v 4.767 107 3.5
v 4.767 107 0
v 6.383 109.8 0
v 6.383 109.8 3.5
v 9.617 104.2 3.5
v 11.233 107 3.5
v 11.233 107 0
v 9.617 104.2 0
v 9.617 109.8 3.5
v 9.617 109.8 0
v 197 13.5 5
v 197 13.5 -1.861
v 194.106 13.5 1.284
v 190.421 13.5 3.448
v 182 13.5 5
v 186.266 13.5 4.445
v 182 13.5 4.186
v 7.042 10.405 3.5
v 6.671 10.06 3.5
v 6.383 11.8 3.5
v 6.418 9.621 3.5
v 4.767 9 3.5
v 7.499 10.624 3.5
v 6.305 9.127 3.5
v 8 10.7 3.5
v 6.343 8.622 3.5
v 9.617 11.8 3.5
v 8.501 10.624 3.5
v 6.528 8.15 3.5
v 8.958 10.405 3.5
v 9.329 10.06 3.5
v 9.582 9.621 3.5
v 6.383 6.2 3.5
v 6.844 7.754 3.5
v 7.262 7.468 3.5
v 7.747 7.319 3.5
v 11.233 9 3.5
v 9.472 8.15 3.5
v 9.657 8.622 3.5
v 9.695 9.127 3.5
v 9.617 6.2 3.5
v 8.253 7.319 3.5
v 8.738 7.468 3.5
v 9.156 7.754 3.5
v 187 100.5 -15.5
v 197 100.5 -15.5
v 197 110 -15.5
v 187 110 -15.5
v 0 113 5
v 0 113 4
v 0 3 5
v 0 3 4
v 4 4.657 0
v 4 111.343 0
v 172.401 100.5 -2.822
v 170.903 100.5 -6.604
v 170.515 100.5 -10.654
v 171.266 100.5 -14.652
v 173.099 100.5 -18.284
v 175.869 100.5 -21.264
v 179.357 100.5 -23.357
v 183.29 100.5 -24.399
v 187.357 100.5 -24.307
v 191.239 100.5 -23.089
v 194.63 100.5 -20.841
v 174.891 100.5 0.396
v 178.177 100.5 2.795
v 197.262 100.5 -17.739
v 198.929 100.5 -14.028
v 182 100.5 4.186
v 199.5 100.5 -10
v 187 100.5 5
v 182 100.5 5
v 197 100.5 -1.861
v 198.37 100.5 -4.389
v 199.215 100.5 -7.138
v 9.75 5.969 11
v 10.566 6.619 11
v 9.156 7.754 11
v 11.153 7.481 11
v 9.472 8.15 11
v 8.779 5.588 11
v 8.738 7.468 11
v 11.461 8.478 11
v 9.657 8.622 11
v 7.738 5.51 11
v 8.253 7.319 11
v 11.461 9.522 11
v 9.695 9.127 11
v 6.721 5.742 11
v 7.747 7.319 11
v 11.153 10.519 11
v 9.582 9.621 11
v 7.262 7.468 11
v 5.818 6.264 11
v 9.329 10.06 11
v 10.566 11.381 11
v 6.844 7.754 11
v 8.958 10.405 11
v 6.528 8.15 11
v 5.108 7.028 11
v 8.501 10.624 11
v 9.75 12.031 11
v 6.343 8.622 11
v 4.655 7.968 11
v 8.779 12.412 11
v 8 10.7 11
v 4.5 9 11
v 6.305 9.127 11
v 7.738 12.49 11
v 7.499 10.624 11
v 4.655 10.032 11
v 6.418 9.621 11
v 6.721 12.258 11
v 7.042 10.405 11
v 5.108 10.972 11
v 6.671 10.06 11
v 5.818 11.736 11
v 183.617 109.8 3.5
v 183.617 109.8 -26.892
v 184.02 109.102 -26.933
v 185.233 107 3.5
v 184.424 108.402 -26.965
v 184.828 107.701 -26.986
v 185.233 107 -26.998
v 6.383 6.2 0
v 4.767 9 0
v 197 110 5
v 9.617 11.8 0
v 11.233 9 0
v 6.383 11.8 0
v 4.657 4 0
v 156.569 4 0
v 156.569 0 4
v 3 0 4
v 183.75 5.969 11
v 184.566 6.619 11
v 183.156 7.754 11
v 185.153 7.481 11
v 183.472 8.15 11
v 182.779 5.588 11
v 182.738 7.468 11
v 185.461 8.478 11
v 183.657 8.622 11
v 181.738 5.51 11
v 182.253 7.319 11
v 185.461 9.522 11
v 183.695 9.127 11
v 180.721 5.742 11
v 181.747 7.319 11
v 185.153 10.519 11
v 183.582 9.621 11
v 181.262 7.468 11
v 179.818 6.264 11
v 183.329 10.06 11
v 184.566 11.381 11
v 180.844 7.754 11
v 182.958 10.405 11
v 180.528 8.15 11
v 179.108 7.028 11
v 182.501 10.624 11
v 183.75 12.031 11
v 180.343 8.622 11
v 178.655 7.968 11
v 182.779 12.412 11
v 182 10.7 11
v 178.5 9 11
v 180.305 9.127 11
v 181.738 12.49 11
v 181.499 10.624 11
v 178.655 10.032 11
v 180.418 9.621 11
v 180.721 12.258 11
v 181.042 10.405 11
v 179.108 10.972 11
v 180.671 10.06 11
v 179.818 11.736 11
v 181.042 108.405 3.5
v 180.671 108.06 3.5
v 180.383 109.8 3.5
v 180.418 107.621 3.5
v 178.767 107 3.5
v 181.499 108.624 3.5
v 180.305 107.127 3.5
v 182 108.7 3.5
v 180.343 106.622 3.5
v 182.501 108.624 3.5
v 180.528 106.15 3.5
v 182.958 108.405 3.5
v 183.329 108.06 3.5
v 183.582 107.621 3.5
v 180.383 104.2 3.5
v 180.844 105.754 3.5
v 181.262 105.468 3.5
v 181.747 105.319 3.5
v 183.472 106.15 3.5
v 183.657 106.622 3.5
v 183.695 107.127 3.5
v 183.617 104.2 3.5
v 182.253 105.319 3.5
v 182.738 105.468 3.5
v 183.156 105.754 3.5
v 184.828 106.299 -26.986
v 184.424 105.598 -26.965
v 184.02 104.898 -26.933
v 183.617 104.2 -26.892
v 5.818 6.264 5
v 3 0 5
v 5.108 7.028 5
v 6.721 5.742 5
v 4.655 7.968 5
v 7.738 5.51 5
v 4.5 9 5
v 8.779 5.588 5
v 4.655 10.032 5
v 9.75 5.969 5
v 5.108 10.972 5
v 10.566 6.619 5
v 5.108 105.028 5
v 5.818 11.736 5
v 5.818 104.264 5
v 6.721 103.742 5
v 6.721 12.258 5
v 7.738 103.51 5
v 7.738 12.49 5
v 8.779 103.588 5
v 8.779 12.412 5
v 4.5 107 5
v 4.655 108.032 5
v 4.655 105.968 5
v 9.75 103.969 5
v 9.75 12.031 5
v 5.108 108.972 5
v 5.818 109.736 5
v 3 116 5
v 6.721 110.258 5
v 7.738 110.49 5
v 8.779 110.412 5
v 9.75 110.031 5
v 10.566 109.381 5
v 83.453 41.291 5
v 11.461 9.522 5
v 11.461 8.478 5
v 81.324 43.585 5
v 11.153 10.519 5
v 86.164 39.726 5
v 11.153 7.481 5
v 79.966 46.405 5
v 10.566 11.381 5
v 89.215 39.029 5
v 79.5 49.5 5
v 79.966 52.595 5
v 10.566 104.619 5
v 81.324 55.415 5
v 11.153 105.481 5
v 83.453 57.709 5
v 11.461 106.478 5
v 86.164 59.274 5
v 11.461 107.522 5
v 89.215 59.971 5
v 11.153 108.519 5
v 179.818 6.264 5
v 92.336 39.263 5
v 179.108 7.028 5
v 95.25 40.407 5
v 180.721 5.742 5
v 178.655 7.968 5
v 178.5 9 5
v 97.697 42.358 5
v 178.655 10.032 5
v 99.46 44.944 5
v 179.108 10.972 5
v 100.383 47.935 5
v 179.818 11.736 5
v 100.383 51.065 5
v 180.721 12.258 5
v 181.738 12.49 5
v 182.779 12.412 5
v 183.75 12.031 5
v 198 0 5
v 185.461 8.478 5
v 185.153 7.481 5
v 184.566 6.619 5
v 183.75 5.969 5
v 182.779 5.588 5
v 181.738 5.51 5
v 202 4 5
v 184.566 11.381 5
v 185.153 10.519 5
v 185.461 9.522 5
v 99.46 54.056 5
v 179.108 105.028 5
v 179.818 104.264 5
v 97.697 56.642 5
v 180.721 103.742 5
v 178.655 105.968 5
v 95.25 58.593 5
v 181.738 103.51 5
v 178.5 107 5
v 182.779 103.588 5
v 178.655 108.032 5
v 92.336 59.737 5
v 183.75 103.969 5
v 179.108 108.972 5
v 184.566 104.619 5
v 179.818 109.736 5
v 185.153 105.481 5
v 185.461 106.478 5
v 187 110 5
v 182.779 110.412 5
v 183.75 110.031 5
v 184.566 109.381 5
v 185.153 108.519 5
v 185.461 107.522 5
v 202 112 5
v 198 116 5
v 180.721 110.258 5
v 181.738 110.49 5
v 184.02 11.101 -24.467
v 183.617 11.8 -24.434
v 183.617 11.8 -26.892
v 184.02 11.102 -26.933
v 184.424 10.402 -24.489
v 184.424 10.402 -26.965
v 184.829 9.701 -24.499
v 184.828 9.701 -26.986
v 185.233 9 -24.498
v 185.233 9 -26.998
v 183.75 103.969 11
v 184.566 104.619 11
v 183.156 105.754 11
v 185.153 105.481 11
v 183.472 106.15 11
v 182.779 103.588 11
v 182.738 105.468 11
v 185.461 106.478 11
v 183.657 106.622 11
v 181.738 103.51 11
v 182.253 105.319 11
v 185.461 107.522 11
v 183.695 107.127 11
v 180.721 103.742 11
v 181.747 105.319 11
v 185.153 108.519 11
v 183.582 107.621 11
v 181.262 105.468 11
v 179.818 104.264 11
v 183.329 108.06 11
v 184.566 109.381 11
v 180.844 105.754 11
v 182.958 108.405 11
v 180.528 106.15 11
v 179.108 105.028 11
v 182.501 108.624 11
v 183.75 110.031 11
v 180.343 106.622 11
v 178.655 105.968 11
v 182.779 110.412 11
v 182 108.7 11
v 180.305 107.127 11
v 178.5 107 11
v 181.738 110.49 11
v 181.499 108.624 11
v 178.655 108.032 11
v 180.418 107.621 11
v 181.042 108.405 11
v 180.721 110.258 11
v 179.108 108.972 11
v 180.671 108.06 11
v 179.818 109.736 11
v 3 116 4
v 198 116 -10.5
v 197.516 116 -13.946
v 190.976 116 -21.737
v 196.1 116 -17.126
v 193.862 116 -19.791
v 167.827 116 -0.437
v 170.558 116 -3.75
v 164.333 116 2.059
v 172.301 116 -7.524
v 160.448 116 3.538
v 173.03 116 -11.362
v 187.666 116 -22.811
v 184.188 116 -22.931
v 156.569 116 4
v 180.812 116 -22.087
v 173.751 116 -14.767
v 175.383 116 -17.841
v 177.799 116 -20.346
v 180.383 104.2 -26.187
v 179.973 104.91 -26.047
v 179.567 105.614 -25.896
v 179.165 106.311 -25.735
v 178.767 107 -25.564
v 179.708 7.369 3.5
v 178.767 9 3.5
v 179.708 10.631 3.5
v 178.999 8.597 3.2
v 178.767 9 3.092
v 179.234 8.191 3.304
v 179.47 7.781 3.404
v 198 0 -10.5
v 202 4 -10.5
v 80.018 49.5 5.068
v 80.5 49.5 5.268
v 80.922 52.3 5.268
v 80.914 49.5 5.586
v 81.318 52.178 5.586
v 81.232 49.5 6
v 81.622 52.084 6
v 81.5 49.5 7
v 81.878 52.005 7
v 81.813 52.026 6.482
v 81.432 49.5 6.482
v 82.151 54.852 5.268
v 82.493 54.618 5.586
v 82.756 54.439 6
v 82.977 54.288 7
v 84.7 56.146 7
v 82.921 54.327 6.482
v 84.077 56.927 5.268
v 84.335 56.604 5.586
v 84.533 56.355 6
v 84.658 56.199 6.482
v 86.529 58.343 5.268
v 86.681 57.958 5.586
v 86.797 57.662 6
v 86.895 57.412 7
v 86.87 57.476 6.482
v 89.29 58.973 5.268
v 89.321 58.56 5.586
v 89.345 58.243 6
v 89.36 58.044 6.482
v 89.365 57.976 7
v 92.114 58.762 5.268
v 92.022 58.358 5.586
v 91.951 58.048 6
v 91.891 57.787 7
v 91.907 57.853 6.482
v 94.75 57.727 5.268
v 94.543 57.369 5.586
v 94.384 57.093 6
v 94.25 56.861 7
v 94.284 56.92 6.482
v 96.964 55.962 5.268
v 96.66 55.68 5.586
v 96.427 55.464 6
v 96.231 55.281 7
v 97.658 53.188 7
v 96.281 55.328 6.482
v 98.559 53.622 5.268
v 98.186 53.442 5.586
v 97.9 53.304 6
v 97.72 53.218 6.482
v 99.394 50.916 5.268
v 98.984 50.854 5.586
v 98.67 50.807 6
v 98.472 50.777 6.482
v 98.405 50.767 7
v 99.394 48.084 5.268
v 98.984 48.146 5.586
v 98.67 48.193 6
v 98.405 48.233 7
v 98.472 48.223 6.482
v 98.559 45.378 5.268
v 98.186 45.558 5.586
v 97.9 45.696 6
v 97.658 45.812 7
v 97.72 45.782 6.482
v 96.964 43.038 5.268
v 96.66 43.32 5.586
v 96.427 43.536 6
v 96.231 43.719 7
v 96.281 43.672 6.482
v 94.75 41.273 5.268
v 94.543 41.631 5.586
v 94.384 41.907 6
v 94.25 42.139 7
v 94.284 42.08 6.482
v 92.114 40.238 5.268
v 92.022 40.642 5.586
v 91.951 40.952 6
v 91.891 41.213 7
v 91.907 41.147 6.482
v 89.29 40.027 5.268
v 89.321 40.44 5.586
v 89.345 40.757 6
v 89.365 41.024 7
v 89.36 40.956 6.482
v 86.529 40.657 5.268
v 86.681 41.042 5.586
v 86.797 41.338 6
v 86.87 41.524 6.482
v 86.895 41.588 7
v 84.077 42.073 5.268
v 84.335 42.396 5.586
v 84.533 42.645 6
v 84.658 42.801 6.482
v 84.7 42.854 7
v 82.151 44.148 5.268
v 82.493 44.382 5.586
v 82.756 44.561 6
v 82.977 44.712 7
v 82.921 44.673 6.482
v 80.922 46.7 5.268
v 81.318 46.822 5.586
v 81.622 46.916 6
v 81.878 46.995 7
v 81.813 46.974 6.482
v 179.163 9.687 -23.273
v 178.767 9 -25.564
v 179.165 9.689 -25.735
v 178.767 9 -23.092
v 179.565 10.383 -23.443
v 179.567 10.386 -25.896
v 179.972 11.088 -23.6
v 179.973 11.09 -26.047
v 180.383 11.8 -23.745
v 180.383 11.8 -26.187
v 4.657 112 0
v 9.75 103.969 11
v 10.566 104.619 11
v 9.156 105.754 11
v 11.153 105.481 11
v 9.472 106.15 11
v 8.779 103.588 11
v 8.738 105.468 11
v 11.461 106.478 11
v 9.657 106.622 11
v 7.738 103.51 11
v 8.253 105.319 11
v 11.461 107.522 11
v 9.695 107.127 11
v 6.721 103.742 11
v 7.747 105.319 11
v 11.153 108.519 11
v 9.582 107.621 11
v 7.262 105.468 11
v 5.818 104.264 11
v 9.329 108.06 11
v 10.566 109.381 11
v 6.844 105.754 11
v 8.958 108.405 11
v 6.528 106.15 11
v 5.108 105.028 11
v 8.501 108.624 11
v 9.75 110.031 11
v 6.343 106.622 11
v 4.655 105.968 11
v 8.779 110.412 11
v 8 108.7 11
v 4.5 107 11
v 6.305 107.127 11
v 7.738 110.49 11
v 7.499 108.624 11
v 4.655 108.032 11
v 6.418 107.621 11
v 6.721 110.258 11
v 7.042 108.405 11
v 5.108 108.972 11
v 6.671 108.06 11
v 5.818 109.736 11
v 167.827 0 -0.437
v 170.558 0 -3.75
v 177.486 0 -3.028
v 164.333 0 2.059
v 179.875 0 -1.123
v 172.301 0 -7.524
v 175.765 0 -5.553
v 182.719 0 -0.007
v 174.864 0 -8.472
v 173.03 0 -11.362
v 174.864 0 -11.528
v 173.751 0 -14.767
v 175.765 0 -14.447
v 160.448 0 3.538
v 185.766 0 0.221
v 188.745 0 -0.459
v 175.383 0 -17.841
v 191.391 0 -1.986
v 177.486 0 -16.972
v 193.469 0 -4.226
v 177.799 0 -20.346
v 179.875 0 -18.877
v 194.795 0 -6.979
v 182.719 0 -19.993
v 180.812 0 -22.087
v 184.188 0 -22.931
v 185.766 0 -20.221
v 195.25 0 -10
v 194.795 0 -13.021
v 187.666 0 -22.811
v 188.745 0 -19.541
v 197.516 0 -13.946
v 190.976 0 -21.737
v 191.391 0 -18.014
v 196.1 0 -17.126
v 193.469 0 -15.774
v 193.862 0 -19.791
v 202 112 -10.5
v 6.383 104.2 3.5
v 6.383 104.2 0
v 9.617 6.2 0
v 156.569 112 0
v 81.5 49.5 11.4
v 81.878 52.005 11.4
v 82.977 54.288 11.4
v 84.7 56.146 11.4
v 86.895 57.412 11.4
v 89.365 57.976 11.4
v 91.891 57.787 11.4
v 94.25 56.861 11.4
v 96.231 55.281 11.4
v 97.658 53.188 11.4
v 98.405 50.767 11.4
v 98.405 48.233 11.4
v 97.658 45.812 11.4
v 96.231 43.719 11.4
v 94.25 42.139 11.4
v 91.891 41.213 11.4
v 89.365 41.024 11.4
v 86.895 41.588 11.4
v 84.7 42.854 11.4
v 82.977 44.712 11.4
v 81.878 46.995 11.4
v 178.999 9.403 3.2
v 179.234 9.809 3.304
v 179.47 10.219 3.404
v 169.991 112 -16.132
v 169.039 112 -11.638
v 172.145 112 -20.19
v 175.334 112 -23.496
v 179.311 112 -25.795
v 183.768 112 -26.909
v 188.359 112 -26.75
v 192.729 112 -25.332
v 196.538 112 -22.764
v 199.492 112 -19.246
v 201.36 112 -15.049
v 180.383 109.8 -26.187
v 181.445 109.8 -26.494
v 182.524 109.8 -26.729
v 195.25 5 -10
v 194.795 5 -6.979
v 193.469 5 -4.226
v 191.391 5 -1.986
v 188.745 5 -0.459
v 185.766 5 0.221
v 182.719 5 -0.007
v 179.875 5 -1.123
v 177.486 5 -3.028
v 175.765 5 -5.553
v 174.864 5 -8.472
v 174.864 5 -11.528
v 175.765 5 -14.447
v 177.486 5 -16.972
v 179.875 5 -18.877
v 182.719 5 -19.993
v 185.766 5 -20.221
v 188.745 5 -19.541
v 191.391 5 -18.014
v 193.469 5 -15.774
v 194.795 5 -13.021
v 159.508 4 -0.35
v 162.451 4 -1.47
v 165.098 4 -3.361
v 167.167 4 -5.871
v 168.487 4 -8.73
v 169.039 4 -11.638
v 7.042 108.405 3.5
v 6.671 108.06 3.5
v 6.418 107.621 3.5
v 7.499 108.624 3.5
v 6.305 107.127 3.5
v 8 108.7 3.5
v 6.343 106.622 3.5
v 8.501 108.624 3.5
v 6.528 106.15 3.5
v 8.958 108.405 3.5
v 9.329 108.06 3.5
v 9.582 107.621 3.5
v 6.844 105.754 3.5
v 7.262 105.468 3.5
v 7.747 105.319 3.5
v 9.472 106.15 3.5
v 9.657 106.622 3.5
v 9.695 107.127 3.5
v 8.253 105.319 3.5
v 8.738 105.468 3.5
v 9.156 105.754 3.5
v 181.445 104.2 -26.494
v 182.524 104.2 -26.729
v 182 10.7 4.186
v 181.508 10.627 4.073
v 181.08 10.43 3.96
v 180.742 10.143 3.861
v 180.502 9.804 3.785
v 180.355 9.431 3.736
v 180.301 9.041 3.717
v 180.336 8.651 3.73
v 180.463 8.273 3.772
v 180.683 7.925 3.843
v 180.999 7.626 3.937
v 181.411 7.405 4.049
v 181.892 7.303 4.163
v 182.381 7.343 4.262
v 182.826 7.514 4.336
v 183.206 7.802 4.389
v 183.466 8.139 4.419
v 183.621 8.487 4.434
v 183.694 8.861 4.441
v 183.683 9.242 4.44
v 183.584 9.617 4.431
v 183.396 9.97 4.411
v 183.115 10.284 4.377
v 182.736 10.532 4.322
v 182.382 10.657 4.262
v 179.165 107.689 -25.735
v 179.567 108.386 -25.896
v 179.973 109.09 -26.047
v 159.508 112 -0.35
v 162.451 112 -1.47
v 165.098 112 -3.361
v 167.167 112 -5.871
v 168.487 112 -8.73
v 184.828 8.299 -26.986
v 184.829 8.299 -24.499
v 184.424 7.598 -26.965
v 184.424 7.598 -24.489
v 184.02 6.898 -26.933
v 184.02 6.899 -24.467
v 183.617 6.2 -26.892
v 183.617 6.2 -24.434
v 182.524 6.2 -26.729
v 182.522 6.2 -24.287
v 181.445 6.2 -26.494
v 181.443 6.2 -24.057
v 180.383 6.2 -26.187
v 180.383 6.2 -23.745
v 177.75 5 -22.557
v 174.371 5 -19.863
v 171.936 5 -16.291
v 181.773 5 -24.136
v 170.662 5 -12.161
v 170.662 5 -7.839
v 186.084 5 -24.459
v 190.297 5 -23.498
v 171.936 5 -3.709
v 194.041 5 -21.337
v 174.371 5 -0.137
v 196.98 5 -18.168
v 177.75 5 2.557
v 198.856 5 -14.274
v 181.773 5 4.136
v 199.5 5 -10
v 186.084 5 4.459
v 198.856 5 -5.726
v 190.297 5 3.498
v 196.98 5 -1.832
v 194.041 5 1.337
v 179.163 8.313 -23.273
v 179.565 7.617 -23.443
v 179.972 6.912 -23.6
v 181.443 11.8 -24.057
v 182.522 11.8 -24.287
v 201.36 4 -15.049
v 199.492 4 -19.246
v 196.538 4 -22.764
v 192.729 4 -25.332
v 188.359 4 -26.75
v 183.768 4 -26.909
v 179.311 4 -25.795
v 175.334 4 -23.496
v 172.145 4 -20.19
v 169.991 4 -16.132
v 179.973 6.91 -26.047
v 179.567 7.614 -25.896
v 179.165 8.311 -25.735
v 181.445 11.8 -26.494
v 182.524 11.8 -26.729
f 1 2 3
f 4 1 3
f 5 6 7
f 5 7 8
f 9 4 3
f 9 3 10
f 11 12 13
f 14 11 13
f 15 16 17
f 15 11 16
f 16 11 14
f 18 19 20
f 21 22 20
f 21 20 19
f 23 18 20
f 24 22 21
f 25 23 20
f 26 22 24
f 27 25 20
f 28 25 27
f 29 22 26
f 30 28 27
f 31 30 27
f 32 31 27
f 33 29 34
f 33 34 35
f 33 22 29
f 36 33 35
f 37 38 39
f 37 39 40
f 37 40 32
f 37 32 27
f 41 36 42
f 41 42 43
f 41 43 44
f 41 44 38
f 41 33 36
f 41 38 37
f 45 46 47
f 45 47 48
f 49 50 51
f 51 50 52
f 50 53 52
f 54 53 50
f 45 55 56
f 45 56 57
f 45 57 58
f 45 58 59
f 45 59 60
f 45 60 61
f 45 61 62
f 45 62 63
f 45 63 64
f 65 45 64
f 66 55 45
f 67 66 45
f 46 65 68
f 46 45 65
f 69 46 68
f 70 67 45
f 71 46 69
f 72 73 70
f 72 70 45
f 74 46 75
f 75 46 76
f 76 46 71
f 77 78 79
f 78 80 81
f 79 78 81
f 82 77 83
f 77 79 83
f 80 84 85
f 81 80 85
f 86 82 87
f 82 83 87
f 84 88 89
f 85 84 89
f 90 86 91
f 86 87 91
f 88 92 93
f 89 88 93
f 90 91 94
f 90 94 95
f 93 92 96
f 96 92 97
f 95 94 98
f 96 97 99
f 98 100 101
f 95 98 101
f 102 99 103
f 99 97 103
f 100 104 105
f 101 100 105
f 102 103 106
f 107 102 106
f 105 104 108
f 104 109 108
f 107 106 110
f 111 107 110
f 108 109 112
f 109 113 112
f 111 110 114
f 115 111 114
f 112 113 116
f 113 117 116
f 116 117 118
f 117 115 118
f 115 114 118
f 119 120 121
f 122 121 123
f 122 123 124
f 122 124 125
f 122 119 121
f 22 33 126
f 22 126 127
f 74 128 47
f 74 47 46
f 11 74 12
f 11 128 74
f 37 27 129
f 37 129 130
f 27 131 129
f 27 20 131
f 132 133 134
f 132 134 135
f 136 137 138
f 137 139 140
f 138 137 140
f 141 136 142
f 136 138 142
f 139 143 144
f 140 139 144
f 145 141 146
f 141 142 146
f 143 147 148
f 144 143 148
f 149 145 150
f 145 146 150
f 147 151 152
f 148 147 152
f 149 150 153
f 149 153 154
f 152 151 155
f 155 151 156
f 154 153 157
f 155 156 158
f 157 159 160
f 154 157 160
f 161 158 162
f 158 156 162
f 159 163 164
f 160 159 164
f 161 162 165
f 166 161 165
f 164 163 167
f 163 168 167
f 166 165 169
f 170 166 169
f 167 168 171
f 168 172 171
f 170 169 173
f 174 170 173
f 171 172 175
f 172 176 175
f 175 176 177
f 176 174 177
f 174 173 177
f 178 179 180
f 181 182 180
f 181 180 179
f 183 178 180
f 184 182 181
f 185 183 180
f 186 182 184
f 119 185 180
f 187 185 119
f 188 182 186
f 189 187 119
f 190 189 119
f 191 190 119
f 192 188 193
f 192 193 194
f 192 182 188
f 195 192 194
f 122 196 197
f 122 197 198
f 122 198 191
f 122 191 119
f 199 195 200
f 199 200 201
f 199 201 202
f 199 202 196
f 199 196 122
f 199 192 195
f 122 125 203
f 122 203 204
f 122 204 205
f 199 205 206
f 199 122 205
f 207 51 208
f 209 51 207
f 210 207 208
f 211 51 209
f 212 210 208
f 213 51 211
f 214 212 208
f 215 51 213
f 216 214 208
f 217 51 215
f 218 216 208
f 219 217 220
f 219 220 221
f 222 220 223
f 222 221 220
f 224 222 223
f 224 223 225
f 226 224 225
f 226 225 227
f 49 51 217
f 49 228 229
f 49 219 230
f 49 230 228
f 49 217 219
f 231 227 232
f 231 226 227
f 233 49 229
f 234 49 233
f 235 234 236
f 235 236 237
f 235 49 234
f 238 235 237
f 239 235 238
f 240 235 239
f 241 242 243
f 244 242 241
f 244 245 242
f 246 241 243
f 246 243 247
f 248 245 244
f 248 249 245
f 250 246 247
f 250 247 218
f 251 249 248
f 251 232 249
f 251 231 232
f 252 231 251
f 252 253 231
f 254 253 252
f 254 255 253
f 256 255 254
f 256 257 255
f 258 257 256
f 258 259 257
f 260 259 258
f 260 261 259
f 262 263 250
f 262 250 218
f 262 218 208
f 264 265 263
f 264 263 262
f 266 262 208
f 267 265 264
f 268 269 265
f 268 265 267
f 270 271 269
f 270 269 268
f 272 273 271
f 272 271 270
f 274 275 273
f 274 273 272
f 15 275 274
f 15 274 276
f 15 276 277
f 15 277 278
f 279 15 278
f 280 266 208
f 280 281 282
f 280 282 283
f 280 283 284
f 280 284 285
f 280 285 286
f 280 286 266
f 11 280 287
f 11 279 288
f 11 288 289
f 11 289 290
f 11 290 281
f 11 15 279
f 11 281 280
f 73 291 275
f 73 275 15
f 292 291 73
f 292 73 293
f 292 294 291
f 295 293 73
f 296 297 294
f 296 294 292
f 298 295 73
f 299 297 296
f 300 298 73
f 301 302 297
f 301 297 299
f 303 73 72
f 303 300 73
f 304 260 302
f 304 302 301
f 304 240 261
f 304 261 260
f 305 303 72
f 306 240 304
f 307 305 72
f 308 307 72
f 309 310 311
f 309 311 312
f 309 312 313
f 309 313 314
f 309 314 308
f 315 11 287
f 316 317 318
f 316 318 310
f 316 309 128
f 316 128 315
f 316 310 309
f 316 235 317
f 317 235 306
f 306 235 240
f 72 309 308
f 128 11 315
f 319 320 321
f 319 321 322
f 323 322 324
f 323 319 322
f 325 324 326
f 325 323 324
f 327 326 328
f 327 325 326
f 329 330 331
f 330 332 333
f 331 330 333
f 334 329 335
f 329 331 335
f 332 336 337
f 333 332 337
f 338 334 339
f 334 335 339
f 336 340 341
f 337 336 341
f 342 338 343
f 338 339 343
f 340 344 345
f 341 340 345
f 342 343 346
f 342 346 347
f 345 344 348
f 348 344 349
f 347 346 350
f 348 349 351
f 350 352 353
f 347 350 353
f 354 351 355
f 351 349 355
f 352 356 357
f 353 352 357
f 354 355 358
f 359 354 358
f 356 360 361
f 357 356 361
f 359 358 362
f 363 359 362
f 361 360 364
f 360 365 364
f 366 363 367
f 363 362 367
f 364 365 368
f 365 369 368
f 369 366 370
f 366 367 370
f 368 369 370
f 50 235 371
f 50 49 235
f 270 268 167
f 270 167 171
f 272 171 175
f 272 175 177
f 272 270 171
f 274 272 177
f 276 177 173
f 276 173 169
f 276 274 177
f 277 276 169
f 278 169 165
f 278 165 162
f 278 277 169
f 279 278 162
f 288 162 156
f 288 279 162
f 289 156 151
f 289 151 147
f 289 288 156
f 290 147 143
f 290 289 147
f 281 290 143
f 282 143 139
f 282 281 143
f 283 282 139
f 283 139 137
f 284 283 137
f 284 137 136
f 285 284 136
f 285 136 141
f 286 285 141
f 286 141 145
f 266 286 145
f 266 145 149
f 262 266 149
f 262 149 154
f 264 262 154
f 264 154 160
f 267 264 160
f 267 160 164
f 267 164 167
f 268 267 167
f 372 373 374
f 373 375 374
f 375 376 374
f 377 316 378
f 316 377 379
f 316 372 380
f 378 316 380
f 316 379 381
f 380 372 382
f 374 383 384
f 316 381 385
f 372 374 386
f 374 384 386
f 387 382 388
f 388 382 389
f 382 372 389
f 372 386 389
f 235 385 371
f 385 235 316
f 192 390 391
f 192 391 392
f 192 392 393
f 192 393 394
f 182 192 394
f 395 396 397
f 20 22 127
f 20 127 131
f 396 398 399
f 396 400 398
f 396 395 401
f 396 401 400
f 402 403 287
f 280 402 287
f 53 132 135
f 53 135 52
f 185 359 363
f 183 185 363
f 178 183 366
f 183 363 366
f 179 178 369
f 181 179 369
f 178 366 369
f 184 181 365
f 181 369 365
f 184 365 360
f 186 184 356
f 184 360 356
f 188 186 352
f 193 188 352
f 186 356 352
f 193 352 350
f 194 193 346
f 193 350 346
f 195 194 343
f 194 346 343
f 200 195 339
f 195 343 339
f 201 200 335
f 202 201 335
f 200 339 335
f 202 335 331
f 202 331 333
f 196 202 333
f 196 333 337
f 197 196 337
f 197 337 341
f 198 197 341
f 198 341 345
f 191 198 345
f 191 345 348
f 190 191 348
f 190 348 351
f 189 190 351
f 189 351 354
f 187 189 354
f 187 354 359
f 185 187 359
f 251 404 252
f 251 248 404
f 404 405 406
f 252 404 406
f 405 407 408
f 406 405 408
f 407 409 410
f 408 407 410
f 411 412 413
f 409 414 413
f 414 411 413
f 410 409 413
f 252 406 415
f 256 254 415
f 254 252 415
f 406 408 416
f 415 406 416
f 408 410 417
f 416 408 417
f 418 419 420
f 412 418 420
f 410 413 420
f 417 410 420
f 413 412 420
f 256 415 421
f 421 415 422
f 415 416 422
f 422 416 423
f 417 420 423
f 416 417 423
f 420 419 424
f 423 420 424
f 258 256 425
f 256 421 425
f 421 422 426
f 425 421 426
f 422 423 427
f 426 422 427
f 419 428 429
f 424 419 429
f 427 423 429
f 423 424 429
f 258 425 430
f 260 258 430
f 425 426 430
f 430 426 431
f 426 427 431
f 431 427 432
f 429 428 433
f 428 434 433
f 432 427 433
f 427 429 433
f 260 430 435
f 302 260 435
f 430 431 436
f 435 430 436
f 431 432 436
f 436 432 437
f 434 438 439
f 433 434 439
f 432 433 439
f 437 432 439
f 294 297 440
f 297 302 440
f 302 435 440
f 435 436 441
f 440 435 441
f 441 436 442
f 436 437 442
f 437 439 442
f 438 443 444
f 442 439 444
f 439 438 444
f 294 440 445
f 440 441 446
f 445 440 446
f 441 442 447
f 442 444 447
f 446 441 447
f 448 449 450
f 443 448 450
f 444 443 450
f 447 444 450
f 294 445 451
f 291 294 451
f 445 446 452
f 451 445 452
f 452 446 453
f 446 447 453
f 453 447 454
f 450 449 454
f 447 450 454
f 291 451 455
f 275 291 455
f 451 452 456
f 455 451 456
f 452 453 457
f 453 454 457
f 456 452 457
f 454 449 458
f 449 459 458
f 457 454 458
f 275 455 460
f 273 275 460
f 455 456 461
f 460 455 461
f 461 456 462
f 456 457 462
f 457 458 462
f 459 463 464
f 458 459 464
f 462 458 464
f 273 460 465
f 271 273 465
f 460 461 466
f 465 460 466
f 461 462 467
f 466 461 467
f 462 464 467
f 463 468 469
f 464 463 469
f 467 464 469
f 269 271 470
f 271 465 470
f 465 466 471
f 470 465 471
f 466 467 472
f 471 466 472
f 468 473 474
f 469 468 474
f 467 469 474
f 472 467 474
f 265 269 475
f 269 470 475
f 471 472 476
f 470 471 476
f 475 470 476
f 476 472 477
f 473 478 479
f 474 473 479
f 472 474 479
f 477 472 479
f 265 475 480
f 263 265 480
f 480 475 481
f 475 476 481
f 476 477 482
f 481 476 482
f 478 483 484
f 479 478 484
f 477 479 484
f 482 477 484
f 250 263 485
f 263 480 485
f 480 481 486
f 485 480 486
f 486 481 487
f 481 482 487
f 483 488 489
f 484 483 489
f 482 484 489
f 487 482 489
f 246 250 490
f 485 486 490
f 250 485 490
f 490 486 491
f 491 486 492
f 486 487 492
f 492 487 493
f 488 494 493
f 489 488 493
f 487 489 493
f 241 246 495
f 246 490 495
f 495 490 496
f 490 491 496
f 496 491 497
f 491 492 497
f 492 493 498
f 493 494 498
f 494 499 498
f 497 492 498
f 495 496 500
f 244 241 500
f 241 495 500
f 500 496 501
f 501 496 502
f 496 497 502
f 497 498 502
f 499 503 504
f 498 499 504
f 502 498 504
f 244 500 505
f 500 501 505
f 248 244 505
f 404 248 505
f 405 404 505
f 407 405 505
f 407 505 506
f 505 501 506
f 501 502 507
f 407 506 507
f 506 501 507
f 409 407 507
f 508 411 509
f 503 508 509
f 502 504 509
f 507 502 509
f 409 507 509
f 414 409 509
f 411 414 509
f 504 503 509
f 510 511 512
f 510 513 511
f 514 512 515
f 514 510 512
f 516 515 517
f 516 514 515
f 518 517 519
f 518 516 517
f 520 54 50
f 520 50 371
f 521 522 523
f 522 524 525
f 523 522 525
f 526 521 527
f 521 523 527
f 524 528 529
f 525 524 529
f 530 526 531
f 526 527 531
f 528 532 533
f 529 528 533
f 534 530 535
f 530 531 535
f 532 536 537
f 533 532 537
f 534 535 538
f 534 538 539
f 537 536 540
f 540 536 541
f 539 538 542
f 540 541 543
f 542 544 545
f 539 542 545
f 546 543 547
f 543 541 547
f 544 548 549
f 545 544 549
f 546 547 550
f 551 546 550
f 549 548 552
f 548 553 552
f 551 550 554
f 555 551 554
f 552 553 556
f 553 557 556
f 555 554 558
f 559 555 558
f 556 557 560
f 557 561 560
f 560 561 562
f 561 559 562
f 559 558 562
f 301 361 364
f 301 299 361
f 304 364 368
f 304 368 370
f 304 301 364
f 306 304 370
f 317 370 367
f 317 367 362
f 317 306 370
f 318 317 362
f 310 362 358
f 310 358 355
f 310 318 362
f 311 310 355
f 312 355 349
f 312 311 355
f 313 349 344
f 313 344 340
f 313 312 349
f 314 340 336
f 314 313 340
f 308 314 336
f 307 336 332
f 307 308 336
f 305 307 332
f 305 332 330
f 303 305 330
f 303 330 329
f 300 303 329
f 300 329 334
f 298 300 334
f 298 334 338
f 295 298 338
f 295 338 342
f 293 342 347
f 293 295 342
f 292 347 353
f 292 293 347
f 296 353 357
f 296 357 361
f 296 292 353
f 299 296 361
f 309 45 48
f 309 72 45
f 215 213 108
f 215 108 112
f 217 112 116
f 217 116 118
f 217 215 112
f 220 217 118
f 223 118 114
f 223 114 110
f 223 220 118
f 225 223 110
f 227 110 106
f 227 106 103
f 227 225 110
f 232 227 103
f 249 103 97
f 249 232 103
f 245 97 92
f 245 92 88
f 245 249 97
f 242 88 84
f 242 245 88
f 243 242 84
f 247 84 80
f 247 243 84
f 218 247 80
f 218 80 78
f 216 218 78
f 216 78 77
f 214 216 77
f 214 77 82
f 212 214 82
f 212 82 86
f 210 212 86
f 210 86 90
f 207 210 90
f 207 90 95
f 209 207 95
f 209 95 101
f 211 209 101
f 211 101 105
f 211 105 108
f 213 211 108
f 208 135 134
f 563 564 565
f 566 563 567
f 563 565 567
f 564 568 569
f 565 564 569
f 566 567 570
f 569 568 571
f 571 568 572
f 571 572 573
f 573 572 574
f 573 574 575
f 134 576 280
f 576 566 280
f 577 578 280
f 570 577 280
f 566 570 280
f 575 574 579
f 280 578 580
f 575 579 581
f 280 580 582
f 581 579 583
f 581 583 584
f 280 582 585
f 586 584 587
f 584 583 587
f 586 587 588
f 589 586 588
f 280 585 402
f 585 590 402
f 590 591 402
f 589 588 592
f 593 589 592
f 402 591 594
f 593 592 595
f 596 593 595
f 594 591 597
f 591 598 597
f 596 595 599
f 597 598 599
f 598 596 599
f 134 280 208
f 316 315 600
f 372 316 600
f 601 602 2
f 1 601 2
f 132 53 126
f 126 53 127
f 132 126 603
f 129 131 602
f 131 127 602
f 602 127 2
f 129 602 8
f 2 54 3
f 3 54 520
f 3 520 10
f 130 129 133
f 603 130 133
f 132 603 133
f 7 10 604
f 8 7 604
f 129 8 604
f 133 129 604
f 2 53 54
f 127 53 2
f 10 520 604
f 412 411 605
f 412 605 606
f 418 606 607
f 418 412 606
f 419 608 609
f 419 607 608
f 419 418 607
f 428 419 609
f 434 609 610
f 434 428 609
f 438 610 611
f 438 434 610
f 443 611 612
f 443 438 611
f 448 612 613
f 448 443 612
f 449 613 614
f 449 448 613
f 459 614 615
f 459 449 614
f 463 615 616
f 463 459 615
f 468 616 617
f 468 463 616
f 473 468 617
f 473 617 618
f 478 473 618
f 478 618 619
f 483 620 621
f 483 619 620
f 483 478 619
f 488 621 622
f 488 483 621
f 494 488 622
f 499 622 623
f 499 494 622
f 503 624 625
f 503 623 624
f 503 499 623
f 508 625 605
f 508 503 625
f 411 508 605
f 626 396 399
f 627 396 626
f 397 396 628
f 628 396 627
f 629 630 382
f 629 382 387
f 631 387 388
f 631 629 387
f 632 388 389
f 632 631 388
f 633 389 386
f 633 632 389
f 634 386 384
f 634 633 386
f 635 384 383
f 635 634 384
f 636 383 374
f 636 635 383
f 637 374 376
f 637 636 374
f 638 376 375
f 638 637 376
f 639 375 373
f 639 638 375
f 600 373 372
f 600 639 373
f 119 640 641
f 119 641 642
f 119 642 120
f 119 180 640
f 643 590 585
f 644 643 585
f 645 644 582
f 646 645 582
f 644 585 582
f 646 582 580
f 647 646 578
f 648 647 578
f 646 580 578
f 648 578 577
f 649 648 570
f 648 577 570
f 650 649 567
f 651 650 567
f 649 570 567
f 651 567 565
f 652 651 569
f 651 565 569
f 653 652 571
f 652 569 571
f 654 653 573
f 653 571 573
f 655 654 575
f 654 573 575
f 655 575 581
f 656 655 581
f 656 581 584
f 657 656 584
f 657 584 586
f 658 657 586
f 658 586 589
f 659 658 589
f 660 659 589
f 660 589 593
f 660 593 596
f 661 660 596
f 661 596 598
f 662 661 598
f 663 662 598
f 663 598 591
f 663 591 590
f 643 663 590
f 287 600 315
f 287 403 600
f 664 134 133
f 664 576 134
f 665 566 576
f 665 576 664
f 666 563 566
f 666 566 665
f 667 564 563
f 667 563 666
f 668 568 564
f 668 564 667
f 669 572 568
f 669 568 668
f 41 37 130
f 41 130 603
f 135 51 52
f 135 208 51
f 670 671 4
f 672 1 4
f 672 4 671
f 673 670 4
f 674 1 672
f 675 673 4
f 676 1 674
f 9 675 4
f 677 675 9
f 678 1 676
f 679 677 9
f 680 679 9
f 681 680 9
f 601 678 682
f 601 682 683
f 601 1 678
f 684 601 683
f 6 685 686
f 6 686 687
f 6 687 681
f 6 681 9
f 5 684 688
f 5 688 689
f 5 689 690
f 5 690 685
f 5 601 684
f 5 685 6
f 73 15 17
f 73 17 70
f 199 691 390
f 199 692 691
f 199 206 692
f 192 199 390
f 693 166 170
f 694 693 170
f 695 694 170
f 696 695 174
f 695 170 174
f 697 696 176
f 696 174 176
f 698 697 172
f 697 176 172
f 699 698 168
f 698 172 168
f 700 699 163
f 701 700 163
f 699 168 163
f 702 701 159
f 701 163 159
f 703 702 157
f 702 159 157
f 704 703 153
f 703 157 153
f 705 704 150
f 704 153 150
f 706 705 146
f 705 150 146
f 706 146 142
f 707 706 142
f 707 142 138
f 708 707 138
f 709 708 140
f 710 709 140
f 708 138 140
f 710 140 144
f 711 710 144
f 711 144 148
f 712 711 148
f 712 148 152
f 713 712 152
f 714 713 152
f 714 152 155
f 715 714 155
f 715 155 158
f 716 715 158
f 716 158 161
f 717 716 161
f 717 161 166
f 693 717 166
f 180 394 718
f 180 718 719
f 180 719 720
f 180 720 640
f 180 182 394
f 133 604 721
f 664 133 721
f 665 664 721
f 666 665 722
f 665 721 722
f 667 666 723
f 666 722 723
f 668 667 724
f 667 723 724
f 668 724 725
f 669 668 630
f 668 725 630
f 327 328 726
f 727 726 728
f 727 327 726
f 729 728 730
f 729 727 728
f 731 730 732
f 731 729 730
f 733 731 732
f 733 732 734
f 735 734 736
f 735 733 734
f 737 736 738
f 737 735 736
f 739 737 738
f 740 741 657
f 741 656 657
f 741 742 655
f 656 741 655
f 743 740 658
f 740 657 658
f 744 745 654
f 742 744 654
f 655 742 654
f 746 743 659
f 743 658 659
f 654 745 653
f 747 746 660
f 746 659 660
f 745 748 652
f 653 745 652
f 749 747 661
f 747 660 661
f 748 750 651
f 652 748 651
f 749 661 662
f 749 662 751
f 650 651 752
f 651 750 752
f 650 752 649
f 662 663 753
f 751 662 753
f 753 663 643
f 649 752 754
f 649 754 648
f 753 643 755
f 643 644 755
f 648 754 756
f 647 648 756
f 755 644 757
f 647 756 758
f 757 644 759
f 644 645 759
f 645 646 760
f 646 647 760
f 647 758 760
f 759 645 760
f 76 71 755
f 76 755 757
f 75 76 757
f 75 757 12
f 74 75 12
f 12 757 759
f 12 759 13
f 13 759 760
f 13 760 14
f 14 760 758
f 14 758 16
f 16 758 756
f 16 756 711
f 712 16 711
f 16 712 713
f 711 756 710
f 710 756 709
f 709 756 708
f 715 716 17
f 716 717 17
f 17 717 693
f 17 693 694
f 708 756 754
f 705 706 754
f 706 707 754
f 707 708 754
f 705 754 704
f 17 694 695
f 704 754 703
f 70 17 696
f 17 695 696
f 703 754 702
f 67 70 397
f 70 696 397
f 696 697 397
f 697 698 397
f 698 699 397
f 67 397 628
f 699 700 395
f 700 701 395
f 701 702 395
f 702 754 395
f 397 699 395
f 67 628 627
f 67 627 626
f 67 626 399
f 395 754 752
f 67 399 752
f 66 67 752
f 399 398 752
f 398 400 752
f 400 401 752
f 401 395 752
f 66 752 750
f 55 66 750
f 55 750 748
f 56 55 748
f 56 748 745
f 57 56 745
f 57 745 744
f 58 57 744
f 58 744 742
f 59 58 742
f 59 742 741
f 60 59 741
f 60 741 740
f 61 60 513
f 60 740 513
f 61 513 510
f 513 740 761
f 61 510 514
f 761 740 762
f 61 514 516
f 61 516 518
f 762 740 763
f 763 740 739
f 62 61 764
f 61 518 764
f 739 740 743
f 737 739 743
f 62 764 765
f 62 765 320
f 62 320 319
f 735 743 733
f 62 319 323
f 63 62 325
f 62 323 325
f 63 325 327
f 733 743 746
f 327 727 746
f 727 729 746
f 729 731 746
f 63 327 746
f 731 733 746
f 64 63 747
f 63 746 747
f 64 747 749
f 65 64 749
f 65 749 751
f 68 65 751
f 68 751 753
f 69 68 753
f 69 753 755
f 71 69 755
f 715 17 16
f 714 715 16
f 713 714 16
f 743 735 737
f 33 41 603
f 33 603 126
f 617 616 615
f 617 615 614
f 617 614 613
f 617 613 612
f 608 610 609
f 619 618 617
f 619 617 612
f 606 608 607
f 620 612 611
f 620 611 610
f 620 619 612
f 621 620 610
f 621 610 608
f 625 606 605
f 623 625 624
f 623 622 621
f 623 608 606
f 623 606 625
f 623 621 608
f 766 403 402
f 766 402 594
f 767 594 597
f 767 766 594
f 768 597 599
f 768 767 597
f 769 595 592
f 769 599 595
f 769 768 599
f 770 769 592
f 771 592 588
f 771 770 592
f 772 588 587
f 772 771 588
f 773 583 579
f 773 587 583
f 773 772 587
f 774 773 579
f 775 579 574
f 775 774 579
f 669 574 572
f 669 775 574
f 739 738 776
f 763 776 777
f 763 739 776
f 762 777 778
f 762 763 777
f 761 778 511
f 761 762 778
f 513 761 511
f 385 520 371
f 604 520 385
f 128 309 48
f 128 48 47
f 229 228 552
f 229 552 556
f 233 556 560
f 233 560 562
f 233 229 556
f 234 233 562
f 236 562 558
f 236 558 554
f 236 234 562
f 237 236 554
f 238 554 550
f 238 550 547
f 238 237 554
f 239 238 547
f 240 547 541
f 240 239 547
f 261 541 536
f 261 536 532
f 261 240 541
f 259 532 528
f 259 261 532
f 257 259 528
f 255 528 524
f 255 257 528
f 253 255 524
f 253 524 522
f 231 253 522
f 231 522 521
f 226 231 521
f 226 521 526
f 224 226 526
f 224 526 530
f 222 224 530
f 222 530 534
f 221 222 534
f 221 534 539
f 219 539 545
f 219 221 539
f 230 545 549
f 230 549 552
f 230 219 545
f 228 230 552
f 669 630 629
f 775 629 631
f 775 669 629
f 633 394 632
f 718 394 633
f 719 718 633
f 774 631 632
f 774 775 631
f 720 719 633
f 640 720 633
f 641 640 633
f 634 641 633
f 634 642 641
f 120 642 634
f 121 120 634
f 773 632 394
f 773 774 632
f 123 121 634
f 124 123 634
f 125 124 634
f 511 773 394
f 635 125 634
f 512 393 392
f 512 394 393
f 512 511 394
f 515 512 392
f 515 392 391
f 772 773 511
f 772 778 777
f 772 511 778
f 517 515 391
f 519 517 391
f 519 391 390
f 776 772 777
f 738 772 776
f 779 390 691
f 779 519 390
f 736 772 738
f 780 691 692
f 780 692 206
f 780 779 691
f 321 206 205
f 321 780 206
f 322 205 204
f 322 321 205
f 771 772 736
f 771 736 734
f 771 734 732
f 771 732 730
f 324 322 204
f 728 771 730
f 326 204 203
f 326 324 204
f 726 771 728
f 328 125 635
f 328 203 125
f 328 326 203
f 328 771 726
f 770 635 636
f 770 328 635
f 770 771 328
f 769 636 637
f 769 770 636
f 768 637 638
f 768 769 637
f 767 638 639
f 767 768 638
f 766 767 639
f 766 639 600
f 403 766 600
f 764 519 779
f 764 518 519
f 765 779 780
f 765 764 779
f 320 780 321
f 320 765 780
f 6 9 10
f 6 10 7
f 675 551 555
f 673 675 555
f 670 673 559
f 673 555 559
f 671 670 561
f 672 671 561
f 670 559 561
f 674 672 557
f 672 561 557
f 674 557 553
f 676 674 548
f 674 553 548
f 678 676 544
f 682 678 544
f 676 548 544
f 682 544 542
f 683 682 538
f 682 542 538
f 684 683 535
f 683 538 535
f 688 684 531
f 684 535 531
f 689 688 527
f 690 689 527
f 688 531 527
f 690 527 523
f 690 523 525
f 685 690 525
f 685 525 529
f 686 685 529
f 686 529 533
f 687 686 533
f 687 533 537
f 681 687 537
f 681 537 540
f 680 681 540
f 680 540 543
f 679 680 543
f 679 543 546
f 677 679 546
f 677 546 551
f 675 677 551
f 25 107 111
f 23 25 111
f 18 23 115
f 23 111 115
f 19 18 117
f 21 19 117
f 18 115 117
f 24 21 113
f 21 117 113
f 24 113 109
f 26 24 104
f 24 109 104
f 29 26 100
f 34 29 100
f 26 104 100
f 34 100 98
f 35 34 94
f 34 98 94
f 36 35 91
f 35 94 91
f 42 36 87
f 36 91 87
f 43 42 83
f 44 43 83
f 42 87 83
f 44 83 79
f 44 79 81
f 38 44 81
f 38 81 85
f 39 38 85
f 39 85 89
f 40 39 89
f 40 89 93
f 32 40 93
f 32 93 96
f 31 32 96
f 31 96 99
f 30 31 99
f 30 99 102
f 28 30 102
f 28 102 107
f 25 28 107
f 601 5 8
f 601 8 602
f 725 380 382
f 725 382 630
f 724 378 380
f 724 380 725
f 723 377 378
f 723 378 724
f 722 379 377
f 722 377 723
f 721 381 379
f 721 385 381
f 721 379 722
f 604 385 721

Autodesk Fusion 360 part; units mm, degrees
sketch "Sketch1" plane through (0, 0, 0) normal (0, 0, 1) x (1, 0, 0)
  line L0 (0, 0) -> (202, 0)
  line L1 (202, 0) -> (202, 116)
  line L2 (202, 116) -> (0, 116)
  line L3 (0, 116) -> (0, 0)
  dimension "d1" = 202
  dimension "d2" = 116
extrude "Extrude1" add sketch "Sketch1" along normal blind 5
sketch "Sketch2" plane through (0, 0, 0) normal (0, 0, -1) x (-1, 0, 0)
  circle A0 centre (-182, 107) radius 3.5
  line L0 (-182, 107) -> (-182, 9) construction
  line L1 (-182, 9) -> (-8, 9) construction
  circle A1 centre (-182, 9) radius 3.5
  line L2 (-8, 9) -> (-8, 107) construction
  circle A2 centre (-8, 9) radius 3.5
  circle A3 centre (-8, 107) radius 3.5
  line L3 (-8, 107) -> (-182, 107) construction
  line L4 (0, 0) -> (0, 116)
  line L5 (0, 116) -> (-202, 116)
  line L6 (-202, 116) -> (-202, 0)
  line L7 (-202, 0) -> (0, 0)
  dimension "d5" = 174
  dimension "d6" = 98
  dimension "d9" = 7
  dimension "d17" = 8
  dimension "d18" = 9
extrude "Extrude4" add sketch "Sketch2" against normal blind 11 contours A0 | A1 | A2 | A3
sketch "Sketch3" plane through (0, 0, 0) normal (0, -1, 0) x (1, 0, 0)
  line L0 (0, 0) -> (202, 0)
  line L1 (202, 0) -> (202, 5)
  line L2 (202, 5) -> (0, 5)
  line L3 (0, 5) -> (0, 0)
  circle A0 centre (185.5, -10.5) radius 16.5
  line L4 (202, -10.5) -> (202, 5)
  line L5 (169, -10.5) -> (169, 5)
  circle A1 centre (185.5, -10.5) radius 15.5
  dimension "d27" = 33
  dimension "d73" = 31
extrude "Extrude5" add sketch "Sketch3" against normal blind 116 contours L0 A0 L5 | L0 L2 A0 A1 | L0 A0 A1 | L0 A1 | L0 A1 | L0 A0 L4 | L0 L2 A0 A1
sketch "Sketch4" plane through (0, 0, 0) normal (0, -1, 0) x (1, 0, 0)
  line L0 (0, 0) -> (169, 0)
  line L1 (202, -10.5) -> (202, 5)
  line L2 (202, 5) -> (0, 5)
  line L3 (0, 5) -> (0, 0)
  circle A0 centre (185, -10) radius 10.25
  circle A1 centre (185, -10) radius 14.5
  line L4 (169, 0) -> (169, -10.5)
  arc A2 (169, -10.5) -> (202, -10.5) centre (185.5, -10.5) ccw
  dimension "d30" = 20.5
  dimension "d42" = 29
sketch "Sketch5" plane through (0, 0, 5) normal (0, 0, 1) x (-1, 0, 0)
  circle A0 centre (-8, -9) radius 3.5
  circle A1 centre (-8, -107) radius 3.5
  line L0 (0, -116) -> (0, 0)
  line L1 (0, 0) -> (-202, 0)
  line L2 (-202, -116) -> (0, -116)
  line L3 (-197, -13.5) -> (-182, -13.5)
  line L4 (-182, -13.5) -> (-182, -100.5)
  line L5 (-182, -100.5) -> (-197, -100.5)
  line L6 (-197, -100.5) -> (-197, -13.5)
  line L7 (-174.75, 0) -> (-195.25, 0)
  line L8 (-197, -100.5) -> (-187, -100.5)
  line L9 (-187, -100.5) -> (-187, -110)
  line L10 (-187, -110) -> (-197, -110)
  line L11 (-197, -110) -> (-197, -100.5)
  circle A2 centre (-182, -9) radius 3.5
  circle A3 centre (-182, -107) radius 3.5
  line L12 (-202, 0) -> (-202, -116)
  point P0 (-189.5, -100.5)
  dimension "d32" = 87
  dimension "d33" = 13.5
  dimension "d34" = 15
  dimension "d51" = 10
  dimension "d52" = 6
extrude "Extrude6" cut sketch "Sketch5" against normal blind 20.5 contours L3 L4 L5 L6 L8 | L5 L8 L9 L10 L11
extrude "Extrude7" cut sketch "Sketch4" against normal blind 95.5 from surface at -5 contours A0 | A1
sketch "Sketch6" plane through (0, 13.5, 0) normal (0, 1, 0) x (-1, 0, 0)
  line L0 (-197, 5) -> (-197, -1.8606)
  line L1 (-169, 0) -> (0, 0)
  line L2 (0, 0) -> (0, 5)
  line L3 (0, 5) -> (-202, 5)
  line L4 (-202, 5) -> (-202, -10.5)
  arc A0 (-202, -10.5) -> (-169, -10.5) centre (-185.5, -10.5) ccw
  circle A1 centre (-185.5, -10.5) radius 15
  line L5 (-169, -10.5) -> (-169, 0)
  line L6 (-182, 4.1863) -> (-182, 5)
  arc A2 (-182, 4.1863) -> (-197, -1.8606) centre (-185, -10) ccw
  line L7 (-182, 5) -> (-197, 5)
  dimension "d39" = 30
extrude "Extrude9" cut sketch "Sketch4" against normal blind 33 contours A0
fillet "Fillet2" radius 12.5 1 edges at (169, 58, 0)
sketch "Sketch7" plane through (0, 0, 5) normal (0, 0, 1) x (-1, 0, 0)
  circle A0 centre (-8, -9) radius 3.5
  circle A1 centre (-8, -107) radius 3.5
  line L0 (0, -116) -> (0, 0)
  line L1 (0, 0) -> (-202, 0)
  line L2 (-202, -116) -> (0, -116)
  line L3 (-187, -100.5) -> (-187, -110)
  line L4 (-187, -110) -> (-197, -110)
  line L5 (-197, -110) -> (-197, -100.5)
  line L6 (-197, -13.5) -> (-182, -13.5)
  line L7 (-182, -100.5) -> (-187, -100.5)
  circle A2 centre (-182, -107) radius 3.5
  line L8 (-202, 0) -> (-202, -116)
  line L9 (-182, -13.5) -> (-182, -100.5)
  circle A3 centre (-182, -9) radius 3.5
  line L10 (-197, -100.5) -> (-197, -13.5)
sketch "Sketch8" plane through (0, 0, 5) normal (0, 0, 1) x (-1, 0, 0)
  circle A0 centre (-90, -49.5) radius 8.5
  line L0 (0, -116) -> (0, 0)
  line L1 (0, 0) -> (-202, 0)
  dimension "d53" = 17
  dimension "d54" = 90
  dimension "d55" = 49.5
extrude "Extrude10" add sketch "Sketch8" along normal blind 6.4
fillet "Fillet3" radius 2 1 edges at (97.9248, 46.4263, 5)
sketch "Sketch9" plane through (0, 0, 0) normal (0, 0, -1) x (1, 0, 0)
  line L0 (156.569, 0) -> (0, 0)
  line L1 (0, 0) -> (0, -116)
  line L2 (0, -116) -> (156.569, -116)
  line L3 (6.3834, -104.2) -> (4.7668, -107)
  line L4 (4.7668, -107) -> (6.3834, -109.8)
  line L5 (6.3834, -109.8) -> (9.6166, -109.8)
  line L6 (9.6166, -109.8) -> (11.2332, -107)
  line L7 (11.2332, -107) -> (9.6166, -104.2)
  line L8 (9.6166, -104.2) -> (6.3834, -104.2)
  line L9 (6.3834, -6.2) -> (4.7668, -9)
  line L10 (4.7668, -9) -> (6.3834, -11.8)
  line L11 (6.3834, -11.8) -> (9.6166, -11.8)
  line L12 (9.6166, -11.8) -> (11.2332, -9)
  line L13 (11.2332, -9) -> (9.6166, -6.2)
  line L14 (9.6166, -6.2) -> (6.3834, -6.2)
  line L15 (178.7668, -107) -> (180.3834, -109.8)
  line L16 (180.3834, -109.8) -> (183.6166, -109.8)
  line L17 (183.6166, -109.8) -> (185.2332, -107)
  line L18 (185.2332, -107) -> (183.6166, -104.2)
  line L19 (183.6166, -104.2) -> (180.3834, -104.2)
  line L20 (180.3834, -104.2) -> (178.7668, -107)
  line L21 (183.6166, -6.2) -> (180.3834, -6.2)
  line L22 (180.3834, -6.2) -> (178.7668, -9)
  line L23 (178.7668, -9) -> (180.3834, -11.8)
  line L24 (180.3834, -11.8) -> (183.6166, -11.8)
  line L25 (183.6166, -11.8) -> (185.2332, -9)
  line L26 (185.2332, -9) -> (183.6166, -6.2)
  line L27 (156.569, -116) -> (156.569, 0)
  line L28 (156.569, -116) -> (156.569, 0)
  line L29 (156.569, 0) -> (0, 0)
  line L30 (0, 0) -> (0, -116)
  line L31 (0, -116) -> (156.569, -116)
  point P0 (8, -107)
  point P1 (8, -9)
  point P2 (182, -107)
  point P3 (182, -107)
  point P4 (182, -9)
  point P5 (182, -9)
  dimension "d60" = 5.6
chamfer "Chamfer3" distance 3 angle 45 2 edges at (0, 116, 2.5) (0, 0, 2.5)
chamfer "Chamfer4" distance 4 angle 45 11 edges at (0, 58, 0) (79.7845, 0, 0) (165.0977, 0, -3.3615) (186.0693, 0, -26.9902) (202, 0, -2.75) (1.5, 1.5, 0) (1.5, 114.5, 0) (79.7845, 116, 0) (165.0977, 116, -3.3615) (186.0693, 116, -26.9902) (202, 116, -2.75)
hole "Hole1" at (182, 9, 0) at (182, 107, 0) at (8, 107, 0) at (8, 9, 0) direction (0, 0, 1) diameter 3.4 end through all
extrude "Extrude11" cut sketch "Sketch9" along normal blind 50 and the other way blind 3.5 contours L3 L4 L5 L6 L7 L8 | L9 L10 L11 L12 L13 L14 | L15 L16 L17 L18 L19 L20 | L21 L22 L23 L24 L25 L26
